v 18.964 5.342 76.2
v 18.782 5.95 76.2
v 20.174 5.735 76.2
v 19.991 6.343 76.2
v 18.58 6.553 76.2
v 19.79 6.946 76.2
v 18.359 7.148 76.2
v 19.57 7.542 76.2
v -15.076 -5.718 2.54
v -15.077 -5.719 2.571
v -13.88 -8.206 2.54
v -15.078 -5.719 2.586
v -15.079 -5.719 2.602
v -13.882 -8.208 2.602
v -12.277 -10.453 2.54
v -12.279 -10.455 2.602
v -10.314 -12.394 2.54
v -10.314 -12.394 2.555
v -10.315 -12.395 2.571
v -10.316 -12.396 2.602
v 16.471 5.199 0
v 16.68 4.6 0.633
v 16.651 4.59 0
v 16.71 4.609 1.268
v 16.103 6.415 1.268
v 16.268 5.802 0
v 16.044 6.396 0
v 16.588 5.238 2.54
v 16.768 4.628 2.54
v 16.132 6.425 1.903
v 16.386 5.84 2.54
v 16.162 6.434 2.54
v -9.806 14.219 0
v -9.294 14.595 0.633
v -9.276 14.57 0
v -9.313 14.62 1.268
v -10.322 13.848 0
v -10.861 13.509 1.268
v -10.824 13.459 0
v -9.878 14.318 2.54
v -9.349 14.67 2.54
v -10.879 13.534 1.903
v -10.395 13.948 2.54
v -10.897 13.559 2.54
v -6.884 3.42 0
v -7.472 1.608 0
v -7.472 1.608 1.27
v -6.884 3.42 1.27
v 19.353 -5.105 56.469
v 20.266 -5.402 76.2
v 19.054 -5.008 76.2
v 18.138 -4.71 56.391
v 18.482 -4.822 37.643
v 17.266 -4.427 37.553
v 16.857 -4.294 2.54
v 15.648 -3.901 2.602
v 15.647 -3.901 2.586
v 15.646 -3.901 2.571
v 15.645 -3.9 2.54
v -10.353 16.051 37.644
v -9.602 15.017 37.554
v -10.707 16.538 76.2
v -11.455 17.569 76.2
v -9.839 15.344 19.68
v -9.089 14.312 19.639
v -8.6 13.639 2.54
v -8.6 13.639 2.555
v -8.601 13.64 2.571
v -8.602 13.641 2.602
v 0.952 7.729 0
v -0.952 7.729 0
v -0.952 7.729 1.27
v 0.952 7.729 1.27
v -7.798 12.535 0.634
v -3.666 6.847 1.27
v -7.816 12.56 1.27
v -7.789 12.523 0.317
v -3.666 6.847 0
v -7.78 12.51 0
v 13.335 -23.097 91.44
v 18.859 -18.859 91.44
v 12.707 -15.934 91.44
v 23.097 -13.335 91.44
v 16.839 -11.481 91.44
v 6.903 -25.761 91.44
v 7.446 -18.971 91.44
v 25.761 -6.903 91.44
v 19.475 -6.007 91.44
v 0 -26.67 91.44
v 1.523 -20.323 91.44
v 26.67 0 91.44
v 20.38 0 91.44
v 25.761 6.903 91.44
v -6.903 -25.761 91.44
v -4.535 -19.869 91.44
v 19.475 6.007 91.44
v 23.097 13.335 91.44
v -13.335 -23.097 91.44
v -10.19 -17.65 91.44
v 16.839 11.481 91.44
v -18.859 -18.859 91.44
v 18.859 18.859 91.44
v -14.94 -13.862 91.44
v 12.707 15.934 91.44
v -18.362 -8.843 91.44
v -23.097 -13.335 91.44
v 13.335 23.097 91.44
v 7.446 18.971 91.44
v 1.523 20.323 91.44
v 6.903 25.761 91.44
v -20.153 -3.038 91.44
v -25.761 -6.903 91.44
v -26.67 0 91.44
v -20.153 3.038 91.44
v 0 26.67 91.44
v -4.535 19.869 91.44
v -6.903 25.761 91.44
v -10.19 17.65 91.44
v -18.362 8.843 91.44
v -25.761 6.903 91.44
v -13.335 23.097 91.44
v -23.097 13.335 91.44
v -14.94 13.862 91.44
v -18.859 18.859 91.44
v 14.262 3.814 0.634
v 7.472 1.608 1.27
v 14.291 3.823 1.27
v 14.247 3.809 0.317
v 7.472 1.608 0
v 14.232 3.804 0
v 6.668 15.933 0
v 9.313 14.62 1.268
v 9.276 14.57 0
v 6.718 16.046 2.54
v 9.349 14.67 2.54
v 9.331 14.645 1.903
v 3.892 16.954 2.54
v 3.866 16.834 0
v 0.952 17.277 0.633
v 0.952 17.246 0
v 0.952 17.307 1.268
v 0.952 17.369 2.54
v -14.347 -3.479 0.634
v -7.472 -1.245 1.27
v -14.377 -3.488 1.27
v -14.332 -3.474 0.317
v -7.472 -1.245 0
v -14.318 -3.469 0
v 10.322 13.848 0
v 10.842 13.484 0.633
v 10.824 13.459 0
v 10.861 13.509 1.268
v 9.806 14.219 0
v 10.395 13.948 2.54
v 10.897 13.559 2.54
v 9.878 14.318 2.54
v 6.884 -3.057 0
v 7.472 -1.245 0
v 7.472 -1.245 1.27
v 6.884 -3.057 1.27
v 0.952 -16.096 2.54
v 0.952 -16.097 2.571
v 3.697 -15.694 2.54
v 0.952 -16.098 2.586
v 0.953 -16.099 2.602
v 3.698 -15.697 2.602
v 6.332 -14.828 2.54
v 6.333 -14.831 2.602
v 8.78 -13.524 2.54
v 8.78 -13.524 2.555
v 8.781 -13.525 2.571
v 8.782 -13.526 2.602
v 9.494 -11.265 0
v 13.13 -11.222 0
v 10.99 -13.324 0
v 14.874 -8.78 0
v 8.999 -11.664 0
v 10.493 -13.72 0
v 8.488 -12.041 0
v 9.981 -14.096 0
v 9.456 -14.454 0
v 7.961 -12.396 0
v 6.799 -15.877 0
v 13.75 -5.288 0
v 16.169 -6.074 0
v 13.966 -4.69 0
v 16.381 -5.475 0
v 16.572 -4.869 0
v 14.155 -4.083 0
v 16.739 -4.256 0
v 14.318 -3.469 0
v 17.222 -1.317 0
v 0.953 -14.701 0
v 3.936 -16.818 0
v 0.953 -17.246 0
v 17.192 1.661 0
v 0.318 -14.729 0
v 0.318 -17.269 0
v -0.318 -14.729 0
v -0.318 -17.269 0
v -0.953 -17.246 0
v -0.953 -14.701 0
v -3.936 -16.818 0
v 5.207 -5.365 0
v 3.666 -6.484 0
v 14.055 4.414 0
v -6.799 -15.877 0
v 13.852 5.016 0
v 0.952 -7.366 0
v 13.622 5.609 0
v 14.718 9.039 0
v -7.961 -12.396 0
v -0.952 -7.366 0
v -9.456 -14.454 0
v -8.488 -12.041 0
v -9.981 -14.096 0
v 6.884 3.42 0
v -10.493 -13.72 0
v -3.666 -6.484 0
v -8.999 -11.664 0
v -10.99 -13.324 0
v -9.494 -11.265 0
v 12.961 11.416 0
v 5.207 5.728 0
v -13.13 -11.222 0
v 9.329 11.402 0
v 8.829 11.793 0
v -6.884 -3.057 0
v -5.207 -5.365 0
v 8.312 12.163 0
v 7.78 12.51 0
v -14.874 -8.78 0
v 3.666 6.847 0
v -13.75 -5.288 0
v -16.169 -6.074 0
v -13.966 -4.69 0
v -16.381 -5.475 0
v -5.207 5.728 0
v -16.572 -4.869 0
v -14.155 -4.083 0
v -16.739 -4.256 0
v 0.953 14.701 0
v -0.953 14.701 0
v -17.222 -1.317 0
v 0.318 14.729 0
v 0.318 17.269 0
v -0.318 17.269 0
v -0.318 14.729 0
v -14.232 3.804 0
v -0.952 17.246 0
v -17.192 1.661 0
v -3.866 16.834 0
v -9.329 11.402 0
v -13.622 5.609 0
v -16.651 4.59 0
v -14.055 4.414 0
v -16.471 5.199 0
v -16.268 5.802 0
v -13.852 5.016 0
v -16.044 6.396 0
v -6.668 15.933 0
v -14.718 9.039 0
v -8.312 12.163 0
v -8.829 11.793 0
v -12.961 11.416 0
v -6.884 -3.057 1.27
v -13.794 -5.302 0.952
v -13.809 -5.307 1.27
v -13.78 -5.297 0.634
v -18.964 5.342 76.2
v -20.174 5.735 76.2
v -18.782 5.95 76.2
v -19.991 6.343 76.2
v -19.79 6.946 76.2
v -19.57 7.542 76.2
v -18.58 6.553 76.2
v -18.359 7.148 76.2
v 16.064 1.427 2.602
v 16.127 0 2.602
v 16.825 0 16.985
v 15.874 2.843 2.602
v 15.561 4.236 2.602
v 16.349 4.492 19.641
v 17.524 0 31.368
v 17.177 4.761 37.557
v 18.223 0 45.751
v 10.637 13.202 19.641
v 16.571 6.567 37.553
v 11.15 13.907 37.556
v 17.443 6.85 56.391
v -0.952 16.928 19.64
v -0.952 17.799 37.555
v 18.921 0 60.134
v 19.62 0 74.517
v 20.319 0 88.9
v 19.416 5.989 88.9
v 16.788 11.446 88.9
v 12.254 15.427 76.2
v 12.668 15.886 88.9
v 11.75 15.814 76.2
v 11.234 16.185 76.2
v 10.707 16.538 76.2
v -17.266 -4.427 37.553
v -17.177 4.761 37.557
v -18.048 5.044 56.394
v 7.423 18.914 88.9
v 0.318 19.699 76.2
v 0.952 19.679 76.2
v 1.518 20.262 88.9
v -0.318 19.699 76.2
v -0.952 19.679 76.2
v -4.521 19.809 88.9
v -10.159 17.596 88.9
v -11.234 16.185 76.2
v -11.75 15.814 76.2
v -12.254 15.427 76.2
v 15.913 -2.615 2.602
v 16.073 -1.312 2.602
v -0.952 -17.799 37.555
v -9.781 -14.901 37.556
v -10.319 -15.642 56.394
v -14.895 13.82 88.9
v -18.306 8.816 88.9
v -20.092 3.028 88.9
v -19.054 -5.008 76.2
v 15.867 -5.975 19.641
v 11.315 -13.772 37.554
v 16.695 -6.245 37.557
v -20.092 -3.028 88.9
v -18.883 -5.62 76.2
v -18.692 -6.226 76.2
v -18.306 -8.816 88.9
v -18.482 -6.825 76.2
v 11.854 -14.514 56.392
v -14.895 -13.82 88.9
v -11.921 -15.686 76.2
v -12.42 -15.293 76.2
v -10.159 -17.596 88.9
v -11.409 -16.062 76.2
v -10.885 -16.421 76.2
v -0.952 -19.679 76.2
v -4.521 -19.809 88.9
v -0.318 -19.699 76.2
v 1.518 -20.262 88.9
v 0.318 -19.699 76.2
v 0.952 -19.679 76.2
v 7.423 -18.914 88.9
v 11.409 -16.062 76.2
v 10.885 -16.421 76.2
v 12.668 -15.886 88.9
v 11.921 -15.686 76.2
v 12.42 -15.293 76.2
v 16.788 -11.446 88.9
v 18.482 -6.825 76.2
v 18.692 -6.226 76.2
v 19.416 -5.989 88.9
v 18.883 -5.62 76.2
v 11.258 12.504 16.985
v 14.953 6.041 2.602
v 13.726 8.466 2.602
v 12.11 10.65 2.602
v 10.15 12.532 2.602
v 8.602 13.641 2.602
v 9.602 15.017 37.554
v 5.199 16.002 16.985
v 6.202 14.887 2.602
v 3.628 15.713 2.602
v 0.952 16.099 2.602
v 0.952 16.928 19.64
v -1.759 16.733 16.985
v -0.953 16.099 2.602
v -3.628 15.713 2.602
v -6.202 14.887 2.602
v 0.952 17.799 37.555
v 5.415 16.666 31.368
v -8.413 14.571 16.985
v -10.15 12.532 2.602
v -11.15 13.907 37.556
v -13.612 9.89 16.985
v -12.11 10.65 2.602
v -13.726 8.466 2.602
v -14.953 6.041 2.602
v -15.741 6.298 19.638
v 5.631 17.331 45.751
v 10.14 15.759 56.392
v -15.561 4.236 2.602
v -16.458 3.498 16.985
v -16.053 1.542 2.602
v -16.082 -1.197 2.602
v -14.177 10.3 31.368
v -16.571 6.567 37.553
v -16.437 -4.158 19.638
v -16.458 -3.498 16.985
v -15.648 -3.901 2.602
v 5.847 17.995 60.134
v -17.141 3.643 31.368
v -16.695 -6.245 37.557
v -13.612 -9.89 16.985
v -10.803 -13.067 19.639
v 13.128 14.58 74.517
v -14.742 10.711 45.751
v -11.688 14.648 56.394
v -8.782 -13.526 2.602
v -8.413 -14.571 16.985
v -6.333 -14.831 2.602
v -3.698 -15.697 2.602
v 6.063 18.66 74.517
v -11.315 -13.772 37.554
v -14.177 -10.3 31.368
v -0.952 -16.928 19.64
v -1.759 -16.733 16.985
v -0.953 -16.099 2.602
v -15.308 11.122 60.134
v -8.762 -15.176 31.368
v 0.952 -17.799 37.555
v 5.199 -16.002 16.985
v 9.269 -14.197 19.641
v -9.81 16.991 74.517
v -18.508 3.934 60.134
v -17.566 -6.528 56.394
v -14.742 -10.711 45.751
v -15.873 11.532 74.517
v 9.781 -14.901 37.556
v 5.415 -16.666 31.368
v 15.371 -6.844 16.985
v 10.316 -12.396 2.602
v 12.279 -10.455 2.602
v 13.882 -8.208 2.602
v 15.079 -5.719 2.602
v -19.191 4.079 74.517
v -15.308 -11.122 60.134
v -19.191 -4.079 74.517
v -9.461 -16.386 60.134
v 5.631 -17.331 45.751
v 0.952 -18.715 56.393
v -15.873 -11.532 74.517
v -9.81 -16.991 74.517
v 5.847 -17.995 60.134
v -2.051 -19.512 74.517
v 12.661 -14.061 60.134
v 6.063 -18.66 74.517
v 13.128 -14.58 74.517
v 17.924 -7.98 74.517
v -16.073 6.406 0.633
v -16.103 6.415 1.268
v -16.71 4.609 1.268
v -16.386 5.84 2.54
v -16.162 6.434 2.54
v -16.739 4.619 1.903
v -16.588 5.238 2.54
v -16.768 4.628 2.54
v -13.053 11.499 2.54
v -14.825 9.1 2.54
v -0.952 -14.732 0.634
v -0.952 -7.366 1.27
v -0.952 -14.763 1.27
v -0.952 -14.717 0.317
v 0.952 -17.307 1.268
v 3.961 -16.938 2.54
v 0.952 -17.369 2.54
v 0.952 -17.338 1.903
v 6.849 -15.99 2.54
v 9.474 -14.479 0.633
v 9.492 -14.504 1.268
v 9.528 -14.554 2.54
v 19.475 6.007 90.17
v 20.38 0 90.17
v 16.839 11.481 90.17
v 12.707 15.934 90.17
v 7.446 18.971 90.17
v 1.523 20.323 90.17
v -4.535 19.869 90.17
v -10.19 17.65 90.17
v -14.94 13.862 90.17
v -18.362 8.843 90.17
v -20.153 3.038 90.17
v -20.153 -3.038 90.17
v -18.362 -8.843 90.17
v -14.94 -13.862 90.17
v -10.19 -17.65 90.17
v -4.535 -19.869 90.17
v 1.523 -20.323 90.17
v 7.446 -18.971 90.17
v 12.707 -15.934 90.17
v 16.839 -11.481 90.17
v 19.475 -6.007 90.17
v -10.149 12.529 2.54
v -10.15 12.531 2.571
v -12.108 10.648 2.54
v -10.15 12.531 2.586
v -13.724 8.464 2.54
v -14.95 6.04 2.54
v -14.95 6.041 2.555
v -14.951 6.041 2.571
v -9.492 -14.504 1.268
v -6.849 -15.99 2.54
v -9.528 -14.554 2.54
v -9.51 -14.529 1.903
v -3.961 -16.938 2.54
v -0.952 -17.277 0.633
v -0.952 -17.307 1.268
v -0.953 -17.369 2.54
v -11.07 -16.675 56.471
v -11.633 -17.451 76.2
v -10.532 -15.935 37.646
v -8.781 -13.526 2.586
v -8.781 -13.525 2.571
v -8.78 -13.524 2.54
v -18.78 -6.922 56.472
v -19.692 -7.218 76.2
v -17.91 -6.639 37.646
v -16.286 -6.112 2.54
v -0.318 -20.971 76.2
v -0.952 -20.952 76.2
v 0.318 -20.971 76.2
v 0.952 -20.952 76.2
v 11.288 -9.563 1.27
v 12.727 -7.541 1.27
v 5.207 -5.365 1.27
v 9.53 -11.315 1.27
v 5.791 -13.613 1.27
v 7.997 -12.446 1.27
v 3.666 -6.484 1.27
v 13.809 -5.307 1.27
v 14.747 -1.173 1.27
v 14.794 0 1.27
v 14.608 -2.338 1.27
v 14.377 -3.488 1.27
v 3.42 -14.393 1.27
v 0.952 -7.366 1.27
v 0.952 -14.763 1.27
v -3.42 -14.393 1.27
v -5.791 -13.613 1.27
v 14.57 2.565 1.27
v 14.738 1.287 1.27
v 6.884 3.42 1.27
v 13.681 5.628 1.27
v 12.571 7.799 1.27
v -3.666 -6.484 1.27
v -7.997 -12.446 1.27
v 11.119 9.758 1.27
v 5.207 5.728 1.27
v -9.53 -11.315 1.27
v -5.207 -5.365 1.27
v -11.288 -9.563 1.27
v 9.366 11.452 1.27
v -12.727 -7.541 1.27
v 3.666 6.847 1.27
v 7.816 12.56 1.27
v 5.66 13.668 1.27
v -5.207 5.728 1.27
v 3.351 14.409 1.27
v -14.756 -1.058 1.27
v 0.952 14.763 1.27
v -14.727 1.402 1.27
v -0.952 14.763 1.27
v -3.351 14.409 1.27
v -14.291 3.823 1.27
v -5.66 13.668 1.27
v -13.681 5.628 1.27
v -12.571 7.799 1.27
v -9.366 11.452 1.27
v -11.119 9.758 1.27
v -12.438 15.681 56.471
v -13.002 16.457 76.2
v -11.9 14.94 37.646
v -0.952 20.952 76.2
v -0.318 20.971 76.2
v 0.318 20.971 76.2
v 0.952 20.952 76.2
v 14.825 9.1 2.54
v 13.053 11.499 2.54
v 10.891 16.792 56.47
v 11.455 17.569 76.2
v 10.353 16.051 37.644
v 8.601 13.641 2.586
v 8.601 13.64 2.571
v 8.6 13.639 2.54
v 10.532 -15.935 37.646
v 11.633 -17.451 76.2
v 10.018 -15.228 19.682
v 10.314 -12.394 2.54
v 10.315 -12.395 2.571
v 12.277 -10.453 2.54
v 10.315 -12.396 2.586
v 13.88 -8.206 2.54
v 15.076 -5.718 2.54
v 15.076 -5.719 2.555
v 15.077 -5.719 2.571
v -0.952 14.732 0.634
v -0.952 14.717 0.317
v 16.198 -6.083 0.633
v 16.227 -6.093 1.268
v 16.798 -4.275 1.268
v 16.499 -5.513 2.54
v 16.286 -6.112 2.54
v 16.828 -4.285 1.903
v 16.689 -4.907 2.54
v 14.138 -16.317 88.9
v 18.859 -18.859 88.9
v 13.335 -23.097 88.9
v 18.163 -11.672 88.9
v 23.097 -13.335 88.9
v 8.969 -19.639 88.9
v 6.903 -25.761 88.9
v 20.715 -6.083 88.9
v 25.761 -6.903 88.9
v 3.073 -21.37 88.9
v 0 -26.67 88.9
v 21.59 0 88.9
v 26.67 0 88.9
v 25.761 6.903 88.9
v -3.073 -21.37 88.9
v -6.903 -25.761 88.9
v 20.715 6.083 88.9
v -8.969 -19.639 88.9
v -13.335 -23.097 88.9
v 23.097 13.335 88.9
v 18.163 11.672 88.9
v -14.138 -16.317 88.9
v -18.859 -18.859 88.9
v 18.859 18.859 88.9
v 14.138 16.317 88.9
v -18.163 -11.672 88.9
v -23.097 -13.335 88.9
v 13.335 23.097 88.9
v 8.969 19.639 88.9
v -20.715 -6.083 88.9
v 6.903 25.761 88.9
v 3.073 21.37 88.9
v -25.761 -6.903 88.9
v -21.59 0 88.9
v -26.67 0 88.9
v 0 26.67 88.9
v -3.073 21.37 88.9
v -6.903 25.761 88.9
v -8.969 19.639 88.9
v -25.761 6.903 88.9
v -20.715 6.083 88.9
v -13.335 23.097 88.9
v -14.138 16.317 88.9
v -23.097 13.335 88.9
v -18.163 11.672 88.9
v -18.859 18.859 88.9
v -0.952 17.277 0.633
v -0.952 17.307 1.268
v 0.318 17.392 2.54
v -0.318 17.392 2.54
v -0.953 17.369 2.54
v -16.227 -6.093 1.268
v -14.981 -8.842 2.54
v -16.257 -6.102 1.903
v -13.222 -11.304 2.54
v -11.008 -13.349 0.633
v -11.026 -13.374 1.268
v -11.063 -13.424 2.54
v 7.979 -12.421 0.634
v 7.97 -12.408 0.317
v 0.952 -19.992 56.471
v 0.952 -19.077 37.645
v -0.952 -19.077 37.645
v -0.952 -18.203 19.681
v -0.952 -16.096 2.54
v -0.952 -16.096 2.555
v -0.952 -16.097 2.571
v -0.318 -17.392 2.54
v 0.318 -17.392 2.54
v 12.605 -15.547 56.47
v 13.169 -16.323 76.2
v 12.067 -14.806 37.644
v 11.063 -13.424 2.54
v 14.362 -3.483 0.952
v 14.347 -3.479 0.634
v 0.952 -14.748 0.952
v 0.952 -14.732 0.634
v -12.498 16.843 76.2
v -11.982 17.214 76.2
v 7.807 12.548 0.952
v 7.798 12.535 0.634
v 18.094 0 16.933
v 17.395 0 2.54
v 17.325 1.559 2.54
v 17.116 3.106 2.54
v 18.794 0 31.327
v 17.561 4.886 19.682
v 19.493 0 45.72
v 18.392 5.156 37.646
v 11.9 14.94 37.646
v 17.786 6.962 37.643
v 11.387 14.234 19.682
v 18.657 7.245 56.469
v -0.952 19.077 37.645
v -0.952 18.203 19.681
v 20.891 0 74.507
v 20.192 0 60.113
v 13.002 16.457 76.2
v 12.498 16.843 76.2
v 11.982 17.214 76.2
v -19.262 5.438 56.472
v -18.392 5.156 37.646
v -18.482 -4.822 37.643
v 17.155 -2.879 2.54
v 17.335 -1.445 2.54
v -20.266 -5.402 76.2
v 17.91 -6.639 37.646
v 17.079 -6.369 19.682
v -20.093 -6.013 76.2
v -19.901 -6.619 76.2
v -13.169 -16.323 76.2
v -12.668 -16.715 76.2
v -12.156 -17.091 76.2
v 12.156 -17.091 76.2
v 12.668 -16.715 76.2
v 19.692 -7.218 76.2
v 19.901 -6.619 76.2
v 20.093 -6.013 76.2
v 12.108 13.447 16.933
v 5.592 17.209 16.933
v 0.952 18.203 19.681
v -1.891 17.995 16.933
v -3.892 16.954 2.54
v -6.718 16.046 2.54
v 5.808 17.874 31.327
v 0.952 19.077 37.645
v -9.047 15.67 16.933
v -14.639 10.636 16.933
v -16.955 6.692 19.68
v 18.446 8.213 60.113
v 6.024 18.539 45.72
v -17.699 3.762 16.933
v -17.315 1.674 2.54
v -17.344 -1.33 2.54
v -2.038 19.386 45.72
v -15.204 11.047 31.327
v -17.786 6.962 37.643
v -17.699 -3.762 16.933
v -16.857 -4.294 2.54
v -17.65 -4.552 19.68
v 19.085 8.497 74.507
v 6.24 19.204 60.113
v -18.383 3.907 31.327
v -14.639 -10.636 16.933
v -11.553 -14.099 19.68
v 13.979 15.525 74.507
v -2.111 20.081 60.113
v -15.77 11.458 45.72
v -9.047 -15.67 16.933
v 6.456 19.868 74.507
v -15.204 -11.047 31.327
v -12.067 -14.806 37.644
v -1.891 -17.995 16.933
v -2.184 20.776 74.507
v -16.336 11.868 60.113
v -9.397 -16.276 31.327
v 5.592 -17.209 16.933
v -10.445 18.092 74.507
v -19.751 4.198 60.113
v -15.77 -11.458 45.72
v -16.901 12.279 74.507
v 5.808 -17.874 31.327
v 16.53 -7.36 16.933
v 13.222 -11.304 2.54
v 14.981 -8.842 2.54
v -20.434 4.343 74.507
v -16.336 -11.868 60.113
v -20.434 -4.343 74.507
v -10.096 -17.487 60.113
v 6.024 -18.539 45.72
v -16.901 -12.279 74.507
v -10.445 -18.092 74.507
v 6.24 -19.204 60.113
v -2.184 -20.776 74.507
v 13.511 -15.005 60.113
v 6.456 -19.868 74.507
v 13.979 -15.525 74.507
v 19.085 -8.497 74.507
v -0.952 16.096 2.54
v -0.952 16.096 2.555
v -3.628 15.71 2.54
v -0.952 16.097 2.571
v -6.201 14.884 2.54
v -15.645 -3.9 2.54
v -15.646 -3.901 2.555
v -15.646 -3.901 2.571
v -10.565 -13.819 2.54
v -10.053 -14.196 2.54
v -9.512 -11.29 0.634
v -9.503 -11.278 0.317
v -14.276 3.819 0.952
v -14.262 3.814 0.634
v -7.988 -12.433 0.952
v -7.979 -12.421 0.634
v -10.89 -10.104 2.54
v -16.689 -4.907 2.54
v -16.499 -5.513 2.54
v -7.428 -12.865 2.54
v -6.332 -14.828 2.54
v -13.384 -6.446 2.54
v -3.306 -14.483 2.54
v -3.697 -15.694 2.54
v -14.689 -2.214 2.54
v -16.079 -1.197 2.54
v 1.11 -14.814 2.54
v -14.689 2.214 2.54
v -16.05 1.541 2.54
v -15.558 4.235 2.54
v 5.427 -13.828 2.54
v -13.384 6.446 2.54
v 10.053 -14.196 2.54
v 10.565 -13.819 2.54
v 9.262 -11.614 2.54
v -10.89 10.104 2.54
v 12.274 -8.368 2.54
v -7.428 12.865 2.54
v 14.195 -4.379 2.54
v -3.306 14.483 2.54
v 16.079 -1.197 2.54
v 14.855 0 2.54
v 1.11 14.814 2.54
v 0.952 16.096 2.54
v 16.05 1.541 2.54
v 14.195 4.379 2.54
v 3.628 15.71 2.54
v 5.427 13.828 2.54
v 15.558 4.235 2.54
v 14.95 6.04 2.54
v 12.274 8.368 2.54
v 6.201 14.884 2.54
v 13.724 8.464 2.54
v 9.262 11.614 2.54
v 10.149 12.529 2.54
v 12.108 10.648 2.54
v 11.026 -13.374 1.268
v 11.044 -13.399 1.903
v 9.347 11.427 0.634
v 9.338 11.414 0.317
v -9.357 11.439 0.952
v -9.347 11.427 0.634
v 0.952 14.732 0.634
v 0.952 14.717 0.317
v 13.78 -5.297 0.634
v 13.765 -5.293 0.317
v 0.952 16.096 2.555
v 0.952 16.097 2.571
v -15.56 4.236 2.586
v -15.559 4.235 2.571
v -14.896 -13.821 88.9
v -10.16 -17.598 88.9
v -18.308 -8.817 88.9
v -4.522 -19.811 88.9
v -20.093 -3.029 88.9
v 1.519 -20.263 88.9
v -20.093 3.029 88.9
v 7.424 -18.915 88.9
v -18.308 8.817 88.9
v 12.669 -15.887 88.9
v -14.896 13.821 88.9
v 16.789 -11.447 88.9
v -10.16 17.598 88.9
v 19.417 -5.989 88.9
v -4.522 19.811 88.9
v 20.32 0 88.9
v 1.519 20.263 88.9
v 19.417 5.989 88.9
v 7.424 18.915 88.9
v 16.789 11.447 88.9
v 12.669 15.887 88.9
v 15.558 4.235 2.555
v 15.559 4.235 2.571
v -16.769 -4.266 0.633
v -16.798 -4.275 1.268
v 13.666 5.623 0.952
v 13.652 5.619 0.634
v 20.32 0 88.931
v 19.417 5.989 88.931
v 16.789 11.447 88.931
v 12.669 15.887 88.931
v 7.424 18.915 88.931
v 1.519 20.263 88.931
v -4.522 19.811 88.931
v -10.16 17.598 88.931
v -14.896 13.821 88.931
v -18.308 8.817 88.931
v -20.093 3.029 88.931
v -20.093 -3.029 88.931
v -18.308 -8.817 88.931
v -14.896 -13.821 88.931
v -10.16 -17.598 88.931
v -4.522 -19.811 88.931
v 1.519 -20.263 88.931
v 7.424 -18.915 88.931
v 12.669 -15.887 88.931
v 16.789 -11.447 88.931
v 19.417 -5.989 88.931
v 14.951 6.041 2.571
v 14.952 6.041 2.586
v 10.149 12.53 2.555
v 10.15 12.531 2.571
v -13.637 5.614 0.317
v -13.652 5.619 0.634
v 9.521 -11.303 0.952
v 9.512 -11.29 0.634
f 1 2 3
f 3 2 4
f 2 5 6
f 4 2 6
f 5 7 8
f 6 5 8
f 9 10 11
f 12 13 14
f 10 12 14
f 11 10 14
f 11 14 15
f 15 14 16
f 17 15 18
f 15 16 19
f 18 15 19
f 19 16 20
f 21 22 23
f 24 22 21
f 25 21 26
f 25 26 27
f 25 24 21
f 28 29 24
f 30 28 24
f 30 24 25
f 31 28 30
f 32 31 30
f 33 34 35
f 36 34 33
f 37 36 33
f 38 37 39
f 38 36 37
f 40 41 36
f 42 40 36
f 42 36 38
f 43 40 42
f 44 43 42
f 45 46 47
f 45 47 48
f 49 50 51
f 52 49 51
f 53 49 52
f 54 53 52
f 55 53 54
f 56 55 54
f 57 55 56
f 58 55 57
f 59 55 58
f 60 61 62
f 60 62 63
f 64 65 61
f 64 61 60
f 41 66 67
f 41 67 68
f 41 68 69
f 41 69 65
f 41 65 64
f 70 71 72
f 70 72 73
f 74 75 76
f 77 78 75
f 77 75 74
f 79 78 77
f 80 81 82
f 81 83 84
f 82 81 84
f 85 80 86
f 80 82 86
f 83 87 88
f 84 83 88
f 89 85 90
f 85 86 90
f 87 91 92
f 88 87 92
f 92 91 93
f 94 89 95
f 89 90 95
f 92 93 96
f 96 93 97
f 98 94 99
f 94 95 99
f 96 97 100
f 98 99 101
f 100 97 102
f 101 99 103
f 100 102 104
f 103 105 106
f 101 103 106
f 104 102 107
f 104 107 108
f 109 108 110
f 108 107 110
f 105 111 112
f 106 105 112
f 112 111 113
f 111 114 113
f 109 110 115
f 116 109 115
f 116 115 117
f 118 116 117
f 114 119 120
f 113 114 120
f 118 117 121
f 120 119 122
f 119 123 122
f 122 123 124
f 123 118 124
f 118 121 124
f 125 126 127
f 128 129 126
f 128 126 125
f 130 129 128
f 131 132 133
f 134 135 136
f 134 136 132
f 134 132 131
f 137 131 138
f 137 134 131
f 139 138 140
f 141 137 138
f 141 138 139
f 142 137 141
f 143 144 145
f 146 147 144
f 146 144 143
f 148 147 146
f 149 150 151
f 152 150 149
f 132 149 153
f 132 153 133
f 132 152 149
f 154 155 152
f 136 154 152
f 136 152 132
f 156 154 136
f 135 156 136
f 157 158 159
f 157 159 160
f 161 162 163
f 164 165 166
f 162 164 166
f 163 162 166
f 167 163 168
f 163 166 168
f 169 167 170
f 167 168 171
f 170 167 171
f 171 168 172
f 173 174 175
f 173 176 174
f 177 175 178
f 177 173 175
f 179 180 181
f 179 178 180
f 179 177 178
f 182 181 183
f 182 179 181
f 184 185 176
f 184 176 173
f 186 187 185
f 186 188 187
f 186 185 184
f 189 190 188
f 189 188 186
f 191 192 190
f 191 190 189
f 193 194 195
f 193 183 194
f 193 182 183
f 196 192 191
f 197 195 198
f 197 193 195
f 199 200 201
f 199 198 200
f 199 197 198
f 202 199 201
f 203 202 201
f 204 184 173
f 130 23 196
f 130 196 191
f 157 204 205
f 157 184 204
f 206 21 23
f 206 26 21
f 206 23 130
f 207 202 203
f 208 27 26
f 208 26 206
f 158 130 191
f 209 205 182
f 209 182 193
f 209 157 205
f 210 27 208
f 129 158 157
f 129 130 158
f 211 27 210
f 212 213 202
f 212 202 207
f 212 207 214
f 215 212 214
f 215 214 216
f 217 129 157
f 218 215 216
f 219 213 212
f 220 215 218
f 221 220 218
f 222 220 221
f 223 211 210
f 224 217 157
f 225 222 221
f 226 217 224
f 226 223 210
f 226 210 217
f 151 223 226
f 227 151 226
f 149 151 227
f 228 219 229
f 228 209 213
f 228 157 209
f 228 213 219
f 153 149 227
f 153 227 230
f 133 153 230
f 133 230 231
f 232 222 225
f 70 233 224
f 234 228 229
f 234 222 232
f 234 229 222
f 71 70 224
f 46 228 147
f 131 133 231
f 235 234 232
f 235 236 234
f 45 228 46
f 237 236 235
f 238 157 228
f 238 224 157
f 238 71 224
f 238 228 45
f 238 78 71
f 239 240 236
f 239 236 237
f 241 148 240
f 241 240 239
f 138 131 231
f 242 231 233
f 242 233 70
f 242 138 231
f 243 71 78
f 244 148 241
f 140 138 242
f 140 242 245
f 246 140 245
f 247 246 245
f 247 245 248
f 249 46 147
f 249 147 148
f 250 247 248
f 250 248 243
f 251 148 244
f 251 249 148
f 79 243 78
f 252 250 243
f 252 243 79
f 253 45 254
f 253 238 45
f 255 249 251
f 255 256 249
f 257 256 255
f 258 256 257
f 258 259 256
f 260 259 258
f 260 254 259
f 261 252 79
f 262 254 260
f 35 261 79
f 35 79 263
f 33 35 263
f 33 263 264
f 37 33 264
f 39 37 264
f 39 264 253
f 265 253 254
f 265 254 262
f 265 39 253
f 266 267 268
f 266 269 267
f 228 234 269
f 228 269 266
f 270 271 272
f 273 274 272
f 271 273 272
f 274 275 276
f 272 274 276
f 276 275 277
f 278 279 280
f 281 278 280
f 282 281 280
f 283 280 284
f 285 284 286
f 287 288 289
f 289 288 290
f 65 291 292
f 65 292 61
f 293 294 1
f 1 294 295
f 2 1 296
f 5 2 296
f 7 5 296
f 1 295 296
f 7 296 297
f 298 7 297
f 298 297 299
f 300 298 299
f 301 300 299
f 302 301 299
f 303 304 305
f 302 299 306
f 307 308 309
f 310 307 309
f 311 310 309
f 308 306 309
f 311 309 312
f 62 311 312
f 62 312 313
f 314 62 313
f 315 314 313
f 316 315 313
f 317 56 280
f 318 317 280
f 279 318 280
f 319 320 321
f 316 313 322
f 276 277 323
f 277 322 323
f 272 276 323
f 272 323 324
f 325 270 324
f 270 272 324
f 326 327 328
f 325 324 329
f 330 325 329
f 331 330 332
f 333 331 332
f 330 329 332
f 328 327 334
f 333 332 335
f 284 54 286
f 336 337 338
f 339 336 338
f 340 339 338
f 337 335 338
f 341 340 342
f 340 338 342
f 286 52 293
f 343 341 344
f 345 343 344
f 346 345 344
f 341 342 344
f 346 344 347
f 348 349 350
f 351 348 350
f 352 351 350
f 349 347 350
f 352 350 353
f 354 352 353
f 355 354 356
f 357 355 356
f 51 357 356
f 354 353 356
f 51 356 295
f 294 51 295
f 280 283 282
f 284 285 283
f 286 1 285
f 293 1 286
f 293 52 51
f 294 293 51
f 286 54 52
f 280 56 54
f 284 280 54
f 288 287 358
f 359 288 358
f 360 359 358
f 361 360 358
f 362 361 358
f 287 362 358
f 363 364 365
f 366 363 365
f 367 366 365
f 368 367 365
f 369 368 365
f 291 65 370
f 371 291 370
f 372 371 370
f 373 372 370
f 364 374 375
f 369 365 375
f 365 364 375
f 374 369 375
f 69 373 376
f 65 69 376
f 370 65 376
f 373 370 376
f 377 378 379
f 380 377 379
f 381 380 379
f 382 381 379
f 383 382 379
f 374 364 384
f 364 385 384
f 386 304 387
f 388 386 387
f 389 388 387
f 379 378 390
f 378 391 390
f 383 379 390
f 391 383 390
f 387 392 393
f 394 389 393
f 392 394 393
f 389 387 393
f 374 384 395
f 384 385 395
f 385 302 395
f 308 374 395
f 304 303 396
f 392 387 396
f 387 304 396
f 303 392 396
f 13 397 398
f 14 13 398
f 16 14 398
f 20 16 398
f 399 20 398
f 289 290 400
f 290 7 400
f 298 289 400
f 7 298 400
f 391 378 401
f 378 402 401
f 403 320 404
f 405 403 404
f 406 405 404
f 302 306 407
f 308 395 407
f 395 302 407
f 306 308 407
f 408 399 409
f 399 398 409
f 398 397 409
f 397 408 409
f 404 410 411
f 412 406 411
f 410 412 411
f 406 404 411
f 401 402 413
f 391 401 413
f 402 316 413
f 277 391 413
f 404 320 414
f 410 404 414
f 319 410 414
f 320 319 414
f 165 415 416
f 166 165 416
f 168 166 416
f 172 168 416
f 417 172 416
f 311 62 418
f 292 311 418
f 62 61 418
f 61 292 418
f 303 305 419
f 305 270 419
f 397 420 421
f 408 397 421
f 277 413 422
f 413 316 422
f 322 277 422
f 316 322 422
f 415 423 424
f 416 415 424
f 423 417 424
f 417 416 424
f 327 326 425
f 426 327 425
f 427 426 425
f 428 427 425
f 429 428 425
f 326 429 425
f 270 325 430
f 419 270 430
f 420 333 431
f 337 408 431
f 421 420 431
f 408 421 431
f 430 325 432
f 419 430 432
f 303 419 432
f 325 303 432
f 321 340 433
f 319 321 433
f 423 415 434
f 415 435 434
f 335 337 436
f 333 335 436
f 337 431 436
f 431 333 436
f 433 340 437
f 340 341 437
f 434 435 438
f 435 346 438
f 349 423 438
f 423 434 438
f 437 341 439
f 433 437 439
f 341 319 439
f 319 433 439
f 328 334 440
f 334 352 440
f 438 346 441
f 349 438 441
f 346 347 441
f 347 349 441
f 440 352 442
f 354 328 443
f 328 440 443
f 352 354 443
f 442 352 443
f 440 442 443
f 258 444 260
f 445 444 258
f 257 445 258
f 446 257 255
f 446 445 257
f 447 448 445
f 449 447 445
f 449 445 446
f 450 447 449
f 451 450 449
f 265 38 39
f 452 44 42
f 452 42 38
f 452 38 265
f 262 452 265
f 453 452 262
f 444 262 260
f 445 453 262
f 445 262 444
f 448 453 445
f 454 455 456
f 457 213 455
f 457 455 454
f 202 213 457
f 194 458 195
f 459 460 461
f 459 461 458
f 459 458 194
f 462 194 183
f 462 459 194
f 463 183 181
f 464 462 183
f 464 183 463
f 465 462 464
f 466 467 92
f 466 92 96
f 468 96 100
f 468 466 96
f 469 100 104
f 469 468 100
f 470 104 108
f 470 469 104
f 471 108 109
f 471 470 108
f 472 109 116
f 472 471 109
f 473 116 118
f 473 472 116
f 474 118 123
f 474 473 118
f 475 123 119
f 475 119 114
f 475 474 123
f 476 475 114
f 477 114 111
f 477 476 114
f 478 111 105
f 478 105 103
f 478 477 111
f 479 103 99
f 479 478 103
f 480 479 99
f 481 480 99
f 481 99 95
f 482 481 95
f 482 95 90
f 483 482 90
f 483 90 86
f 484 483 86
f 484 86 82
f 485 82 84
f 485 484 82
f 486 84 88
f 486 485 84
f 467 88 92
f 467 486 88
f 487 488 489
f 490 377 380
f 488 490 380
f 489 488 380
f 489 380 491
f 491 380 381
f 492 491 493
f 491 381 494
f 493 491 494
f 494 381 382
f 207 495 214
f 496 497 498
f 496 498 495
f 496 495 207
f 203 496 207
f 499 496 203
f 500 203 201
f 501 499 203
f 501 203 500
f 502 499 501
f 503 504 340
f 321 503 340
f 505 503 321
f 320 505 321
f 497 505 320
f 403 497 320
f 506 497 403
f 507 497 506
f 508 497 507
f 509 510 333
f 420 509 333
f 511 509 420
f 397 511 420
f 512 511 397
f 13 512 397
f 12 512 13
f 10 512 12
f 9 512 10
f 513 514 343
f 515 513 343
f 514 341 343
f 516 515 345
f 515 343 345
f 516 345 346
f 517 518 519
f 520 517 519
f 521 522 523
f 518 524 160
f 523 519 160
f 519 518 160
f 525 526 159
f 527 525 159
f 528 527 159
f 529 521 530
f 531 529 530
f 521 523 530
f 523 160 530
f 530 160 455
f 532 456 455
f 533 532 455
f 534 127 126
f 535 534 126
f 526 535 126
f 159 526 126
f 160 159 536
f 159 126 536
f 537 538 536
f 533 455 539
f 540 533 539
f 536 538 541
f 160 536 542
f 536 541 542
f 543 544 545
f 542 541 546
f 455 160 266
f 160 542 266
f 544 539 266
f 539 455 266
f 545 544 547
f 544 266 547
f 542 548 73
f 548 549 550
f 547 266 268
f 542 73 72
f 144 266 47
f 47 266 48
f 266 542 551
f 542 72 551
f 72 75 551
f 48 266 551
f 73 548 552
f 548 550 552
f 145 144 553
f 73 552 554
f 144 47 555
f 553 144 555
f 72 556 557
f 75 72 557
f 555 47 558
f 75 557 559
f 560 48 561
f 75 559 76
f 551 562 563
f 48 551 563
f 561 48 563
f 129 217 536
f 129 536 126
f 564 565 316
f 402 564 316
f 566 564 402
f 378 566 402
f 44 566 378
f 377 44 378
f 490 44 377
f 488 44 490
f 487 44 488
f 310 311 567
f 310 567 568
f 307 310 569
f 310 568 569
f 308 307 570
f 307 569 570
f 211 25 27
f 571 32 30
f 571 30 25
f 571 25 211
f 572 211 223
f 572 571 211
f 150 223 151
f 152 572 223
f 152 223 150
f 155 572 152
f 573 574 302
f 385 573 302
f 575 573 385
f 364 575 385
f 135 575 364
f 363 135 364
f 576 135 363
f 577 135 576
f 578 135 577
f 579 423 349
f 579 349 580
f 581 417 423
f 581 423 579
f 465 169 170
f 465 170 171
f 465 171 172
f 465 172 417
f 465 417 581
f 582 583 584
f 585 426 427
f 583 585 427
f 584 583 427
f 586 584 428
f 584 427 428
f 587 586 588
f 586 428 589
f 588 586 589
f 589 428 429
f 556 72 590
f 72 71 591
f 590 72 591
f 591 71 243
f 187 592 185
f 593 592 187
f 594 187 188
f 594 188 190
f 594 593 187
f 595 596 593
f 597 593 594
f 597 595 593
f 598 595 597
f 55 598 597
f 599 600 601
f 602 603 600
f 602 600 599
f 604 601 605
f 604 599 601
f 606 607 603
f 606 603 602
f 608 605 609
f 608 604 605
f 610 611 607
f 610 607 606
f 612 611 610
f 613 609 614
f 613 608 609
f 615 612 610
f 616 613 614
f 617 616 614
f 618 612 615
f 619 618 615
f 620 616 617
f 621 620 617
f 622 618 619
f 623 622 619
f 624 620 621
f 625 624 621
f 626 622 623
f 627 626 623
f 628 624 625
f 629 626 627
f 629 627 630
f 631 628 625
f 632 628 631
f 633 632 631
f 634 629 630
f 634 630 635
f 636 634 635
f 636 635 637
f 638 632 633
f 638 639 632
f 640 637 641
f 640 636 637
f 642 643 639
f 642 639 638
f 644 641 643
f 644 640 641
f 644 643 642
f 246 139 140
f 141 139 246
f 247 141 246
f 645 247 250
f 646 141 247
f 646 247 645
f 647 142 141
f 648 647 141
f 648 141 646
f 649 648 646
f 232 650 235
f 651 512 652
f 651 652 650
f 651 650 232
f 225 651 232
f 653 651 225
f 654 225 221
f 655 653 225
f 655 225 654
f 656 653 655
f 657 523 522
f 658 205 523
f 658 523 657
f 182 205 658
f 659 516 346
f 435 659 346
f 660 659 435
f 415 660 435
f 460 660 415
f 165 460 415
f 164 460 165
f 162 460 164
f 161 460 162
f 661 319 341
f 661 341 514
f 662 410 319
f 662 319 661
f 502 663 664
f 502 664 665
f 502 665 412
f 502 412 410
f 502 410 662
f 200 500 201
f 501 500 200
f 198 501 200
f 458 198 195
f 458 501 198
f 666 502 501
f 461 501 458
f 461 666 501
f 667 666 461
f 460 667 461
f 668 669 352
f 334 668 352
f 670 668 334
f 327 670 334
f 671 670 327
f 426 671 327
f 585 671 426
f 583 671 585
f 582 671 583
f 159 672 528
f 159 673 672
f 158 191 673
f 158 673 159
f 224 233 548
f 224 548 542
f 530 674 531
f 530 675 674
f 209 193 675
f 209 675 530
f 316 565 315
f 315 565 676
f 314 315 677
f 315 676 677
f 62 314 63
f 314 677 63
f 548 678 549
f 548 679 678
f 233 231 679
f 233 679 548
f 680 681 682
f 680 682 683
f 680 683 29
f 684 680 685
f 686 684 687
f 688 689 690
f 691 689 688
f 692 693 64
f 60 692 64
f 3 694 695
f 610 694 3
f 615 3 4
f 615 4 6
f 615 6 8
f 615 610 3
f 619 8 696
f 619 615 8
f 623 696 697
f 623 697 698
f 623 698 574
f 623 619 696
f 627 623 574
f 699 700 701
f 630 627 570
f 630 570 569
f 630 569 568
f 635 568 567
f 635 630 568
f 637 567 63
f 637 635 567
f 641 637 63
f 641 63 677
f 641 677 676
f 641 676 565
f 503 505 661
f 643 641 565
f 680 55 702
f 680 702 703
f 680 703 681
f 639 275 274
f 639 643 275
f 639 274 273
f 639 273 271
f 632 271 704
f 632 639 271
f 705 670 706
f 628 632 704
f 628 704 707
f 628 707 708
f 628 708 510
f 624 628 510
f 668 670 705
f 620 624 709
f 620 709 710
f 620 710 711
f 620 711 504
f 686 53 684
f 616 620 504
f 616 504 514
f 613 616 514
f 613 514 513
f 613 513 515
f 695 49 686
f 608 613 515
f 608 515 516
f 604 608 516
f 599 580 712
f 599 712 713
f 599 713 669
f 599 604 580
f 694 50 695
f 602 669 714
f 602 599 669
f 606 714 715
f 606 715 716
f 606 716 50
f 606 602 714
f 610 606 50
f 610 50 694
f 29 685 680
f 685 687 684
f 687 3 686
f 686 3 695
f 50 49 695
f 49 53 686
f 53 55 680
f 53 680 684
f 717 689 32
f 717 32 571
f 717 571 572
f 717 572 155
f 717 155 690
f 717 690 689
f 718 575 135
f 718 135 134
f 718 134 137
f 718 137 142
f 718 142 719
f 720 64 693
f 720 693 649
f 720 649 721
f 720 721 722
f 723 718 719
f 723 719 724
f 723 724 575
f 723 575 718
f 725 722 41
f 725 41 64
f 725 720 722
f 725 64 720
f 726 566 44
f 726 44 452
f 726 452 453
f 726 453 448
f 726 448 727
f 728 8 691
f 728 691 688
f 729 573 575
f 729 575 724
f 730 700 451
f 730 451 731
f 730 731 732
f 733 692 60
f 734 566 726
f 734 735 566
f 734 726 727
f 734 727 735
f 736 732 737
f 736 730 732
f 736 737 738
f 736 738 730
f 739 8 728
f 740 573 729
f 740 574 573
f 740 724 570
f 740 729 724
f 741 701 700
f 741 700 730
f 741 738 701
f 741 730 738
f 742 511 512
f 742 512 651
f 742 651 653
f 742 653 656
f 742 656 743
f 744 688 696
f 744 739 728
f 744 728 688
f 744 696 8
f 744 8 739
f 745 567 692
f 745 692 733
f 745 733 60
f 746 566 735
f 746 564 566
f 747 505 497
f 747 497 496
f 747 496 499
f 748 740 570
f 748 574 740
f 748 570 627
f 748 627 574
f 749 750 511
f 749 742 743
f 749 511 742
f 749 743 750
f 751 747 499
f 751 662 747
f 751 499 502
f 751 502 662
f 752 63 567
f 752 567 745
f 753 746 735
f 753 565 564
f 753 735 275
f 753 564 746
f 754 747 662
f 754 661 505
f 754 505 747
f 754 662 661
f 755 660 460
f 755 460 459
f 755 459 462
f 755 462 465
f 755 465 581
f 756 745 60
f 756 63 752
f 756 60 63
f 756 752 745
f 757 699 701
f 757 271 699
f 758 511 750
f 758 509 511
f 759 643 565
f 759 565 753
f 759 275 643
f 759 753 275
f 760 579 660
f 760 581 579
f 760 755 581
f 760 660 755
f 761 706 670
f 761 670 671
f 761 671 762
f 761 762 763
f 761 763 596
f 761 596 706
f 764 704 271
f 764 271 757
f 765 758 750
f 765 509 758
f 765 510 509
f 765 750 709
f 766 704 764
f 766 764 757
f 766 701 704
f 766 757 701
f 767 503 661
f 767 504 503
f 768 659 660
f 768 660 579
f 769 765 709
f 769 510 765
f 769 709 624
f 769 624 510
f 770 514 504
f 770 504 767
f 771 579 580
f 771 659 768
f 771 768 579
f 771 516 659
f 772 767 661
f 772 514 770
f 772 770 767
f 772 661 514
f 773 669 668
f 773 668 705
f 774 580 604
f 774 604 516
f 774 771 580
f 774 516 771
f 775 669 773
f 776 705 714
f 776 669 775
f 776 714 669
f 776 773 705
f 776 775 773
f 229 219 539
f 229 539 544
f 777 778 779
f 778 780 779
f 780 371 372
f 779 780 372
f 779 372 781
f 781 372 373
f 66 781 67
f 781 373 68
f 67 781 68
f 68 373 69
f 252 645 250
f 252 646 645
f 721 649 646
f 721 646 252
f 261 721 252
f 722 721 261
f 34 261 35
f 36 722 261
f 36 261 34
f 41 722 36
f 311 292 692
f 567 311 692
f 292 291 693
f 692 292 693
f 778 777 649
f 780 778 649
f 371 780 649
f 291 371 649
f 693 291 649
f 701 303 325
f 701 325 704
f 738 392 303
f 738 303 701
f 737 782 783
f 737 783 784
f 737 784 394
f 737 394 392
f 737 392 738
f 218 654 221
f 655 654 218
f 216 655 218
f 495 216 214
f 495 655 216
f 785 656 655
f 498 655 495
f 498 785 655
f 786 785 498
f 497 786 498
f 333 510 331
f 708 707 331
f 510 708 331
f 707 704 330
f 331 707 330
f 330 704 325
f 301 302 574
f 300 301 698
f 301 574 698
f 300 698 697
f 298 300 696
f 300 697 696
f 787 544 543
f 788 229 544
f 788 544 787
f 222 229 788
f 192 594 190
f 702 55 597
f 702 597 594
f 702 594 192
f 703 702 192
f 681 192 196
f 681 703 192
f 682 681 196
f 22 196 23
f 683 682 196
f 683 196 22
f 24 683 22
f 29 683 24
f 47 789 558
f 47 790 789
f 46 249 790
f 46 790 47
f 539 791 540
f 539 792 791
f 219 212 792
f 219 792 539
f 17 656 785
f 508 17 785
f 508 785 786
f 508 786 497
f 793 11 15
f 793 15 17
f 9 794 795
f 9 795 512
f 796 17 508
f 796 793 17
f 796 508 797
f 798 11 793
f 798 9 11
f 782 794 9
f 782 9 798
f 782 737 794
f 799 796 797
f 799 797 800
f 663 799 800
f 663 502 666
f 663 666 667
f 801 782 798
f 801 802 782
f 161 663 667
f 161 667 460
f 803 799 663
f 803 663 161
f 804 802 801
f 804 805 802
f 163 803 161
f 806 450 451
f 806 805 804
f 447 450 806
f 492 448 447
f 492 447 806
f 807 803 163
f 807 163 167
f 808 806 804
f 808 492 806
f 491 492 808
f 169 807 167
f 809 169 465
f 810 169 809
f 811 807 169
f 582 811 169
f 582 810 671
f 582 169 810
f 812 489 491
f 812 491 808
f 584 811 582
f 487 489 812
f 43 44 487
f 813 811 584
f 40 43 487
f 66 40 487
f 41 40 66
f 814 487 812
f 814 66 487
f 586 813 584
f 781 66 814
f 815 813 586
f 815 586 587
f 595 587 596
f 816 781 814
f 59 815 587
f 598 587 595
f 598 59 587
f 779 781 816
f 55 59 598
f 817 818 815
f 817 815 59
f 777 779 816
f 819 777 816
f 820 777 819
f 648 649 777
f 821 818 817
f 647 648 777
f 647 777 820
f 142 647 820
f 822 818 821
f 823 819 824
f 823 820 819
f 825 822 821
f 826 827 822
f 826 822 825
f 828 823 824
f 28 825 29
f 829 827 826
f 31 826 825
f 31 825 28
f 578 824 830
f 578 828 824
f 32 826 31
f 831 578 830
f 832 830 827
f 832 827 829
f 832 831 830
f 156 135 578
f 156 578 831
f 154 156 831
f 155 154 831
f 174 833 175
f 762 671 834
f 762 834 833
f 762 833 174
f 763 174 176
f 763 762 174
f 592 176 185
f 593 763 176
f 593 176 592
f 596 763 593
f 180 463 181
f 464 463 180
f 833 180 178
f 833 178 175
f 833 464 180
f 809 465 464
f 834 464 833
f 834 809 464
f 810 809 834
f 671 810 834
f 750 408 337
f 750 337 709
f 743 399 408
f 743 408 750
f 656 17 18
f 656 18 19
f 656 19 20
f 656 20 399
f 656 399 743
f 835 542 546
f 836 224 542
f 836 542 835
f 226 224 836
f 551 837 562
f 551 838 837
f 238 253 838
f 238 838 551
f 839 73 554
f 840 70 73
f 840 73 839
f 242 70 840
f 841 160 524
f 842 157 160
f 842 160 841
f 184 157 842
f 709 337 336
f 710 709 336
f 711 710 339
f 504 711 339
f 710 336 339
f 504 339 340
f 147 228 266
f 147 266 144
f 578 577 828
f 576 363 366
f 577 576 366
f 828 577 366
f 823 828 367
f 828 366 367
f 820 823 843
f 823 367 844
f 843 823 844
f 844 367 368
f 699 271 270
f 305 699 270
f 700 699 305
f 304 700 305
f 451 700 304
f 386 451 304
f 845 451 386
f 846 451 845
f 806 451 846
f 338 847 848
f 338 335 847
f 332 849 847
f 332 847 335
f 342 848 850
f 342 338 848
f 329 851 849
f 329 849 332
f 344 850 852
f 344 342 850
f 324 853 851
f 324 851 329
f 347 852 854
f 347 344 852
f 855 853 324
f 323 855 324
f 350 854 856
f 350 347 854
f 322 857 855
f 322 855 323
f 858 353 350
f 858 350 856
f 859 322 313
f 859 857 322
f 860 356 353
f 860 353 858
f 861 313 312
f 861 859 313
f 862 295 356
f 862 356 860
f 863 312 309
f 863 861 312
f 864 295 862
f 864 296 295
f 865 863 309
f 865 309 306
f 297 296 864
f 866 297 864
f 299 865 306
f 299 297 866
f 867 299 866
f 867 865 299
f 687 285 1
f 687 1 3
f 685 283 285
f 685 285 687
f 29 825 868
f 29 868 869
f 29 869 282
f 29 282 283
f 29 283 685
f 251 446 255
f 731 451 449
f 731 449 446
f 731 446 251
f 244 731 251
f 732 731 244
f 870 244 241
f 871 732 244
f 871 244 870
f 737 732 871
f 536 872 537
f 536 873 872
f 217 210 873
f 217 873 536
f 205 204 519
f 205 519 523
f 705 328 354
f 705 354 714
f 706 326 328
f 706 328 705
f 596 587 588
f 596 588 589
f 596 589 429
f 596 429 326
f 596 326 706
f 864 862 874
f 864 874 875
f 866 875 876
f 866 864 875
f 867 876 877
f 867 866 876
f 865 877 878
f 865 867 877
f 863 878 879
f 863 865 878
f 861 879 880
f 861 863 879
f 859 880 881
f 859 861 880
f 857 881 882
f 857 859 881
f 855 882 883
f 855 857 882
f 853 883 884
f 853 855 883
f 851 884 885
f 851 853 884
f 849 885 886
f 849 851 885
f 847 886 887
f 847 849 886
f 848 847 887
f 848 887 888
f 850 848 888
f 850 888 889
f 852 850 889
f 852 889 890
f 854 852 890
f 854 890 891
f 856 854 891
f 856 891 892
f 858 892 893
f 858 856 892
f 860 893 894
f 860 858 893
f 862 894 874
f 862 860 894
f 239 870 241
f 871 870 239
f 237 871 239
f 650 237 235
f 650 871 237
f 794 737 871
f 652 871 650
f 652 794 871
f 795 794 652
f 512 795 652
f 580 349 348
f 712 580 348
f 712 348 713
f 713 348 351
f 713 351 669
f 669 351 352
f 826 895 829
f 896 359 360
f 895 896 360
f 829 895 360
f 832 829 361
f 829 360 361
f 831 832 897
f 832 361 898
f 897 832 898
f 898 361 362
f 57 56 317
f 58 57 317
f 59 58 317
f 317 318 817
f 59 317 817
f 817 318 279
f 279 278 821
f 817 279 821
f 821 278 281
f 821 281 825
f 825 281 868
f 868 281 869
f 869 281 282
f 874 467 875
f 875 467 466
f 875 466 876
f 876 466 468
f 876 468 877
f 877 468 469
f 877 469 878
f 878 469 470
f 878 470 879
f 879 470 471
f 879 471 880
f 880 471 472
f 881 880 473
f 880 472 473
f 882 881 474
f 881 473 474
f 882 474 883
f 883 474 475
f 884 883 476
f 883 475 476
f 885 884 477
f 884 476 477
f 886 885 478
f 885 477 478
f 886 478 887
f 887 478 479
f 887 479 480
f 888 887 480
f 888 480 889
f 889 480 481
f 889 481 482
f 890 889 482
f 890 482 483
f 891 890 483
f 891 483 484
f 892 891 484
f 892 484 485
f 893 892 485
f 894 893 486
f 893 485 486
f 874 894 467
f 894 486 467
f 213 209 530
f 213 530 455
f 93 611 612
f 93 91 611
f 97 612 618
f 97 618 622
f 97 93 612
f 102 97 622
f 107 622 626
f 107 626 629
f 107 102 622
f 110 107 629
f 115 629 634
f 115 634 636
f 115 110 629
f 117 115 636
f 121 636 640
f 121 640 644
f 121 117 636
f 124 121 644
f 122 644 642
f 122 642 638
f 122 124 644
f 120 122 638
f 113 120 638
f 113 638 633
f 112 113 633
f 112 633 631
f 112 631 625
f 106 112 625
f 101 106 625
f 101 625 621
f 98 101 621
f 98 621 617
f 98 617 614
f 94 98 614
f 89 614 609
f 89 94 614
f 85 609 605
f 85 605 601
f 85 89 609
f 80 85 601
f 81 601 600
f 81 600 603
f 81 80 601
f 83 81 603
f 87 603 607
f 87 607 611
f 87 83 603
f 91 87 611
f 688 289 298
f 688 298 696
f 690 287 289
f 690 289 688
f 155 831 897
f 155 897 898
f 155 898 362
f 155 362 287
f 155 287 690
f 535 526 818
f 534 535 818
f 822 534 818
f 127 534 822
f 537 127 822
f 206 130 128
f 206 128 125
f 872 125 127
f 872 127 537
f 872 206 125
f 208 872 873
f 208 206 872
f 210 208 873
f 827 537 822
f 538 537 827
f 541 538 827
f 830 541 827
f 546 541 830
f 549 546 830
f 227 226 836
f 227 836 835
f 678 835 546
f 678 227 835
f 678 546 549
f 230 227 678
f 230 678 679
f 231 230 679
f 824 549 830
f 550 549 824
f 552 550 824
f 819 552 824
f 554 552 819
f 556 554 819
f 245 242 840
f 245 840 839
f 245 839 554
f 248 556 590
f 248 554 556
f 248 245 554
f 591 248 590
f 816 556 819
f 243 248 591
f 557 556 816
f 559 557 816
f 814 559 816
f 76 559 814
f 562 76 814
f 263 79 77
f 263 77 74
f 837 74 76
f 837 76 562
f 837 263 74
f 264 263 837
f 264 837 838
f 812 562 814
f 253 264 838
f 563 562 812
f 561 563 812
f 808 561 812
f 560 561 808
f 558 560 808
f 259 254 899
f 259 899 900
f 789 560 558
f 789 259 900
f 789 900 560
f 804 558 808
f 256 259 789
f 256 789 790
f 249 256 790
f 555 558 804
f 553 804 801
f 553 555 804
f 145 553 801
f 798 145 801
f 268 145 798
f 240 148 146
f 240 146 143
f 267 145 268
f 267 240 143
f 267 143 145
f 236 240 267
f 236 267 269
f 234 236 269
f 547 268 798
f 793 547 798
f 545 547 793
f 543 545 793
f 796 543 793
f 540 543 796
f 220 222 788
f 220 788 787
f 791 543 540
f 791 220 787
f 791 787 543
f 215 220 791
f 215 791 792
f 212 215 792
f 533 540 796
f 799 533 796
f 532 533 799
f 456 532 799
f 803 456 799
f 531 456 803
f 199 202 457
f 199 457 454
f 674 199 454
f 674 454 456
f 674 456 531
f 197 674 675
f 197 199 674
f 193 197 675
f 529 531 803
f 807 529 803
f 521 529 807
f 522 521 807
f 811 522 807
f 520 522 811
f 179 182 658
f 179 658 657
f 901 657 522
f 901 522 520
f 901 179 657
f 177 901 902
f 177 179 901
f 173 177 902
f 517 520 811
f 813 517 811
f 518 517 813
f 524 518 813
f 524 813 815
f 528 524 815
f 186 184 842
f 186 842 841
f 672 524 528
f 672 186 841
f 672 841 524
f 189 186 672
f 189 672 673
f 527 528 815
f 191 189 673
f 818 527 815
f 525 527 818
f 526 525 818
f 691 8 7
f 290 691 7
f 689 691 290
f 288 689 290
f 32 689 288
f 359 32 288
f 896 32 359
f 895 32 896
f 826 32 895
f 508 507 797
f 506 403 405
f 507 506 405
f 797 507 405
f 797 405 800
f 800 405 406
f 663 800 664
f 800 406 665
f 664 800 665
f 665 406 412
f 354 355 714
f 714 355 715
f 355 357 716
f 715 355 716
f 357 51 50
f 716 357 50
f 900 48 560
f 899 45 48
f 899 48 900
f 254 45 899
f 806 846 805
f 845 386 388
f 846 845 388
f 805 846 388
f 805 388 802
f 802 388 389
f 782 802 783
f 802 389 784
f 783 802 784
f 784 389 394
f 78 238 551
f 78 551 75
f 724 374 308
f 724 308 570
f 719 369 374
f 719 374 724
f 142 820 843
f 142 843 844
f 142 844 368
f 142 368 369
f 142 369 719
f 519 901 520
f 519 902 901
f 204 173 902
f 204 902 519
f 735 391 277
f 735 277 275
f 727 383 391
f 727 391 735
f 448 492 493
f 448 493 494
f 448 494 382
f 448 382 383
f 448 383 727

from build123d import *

# Parameters (mm, degrees)
F2_T     = -1.27
F3_DEPTH = 1.27
F5_R     = 20.32
F6_DEPTH = 25.4
F7_W     = 1.905
F7_H     = 19.812
F8_DEPTH = 76.2


with BuildPart() as f1:
    # F0 (on Front) → F1 (revolve)
    with BuildSketch(Plane.XZ):
        Polygon((0, 2.54), (0, 0), (14.732, 0), (17.272, 0), (17.3953714286, 2.54), align=None)
        Polygon((0, 88.9), (0, 2.54), (17.3953714286, 2.54), (21.59, 88.9), align=None)
        Polygon((0, 91.44), (0, 88.9), (21.59, 88.9), (26.67, 88.9), (26.67, 91.44), align=None)
    revolve(axis=Axis((0, 0, 44.45), (0, 0, 1)))

    # F2
    f2_openings = [f1.faces().sort_by_distance(p)[0] for p in [
        (0, 0, 91.44),
    ]]
    offset(amount=F2_T, openings=f2_openings, kind=Kind.INTERSECTION)

    # F3 (add): a face of the model
    f3_faces = [f1.faces().sort_by_distance(p)[0] for p in [
        (-24.6815795103, 0, 90.17),
    ]]
    extrude(f3_faces, amount=F3_DEPTH)

    # F5 (on offset) → F6 (cut)
    with BuildSketch(Plane.XY.offset(88.9)):
        Circle(F5_R)
    extrude(amount=F6_DEPTH, mode=Mode.SUBTRACT)

    # F7 (on Top) → F8 (cut)
    with BuildSketch(Plane.XY):
        Polygon((0.9525, -27.178), (0.9525, -7.366), (0, -7.366), (-0.9525, -7.366), (-0.9525, -27.178), align=None)
        Polygon((5.2068558942, -5.3647039539), (3.6656785199, -6.4844348595), (15.3108799383, -22.5126795521), (16.8520573126, -21.3929486464), align=None)
        Polygon((7.4723698113, -1.2449737892), (6.883692437, -3.0567364527), (25.7260241378, -9.1789811453), (26.3147015121, -7.3672184818), align=None)
        Polygon((6.883692437, 3.4195935956), (7.4723698113, 1.6078309321), (26.3147015121, 7.7300756246), (25.7260241378, 9.5418382882), align=None)
        Polygon((3.6656785199, 6.8472920024), (5.2068558942, 5.7275610967), (16.8520573126, 21.7558057893), (15.3108799383, 22.8755366949), align=None)
        with Locations((0, 17.6348571429)):
            Rectangle(F7_W, F7_H)
        Polygon((-5.2068558942, 5.7275610967), (-3.6656785199, 6.8472920024), (-15.3108799383, 22.8755366949), (-16.8520573126, 21.7558057893), align=None)
        Polygon((-7.4723698113, 1.6078309321), (-6.883692437, 3.4195935956), (-25.7260241378, 9.5418382882), (-26.3147015121, 7.7300756246), align=None)
        Polygon((-6.883692437, -3.0567364527), (-7.4723698113, -1.2449737892), (-26.3147015121, -7.3672184818), (-25.7260241378, -9.1789811453), align=None)
        Polygon((-3.6656785199, -6.4844348595), (-5.2068558942, -5.3647039539), (-16.8520573126, -21.3929486464), (-15.3108799383, -22.5126795521), align=None)
    extrude(amount=F8_DEPTH, mode=Mode.SUBTRACT)

    # F9 (on Front) → F10 (revolve)
    with BuildSketch(Plane.XZ):
        Polygon((14.8553677996, 2.54), (14.732, 0), (17.272, 0), (17.3953678, 2.54), align=None)
    revolve(axis=Axis((0, 0, 1.27), (0, 0, 1)))


solid = f1.part
